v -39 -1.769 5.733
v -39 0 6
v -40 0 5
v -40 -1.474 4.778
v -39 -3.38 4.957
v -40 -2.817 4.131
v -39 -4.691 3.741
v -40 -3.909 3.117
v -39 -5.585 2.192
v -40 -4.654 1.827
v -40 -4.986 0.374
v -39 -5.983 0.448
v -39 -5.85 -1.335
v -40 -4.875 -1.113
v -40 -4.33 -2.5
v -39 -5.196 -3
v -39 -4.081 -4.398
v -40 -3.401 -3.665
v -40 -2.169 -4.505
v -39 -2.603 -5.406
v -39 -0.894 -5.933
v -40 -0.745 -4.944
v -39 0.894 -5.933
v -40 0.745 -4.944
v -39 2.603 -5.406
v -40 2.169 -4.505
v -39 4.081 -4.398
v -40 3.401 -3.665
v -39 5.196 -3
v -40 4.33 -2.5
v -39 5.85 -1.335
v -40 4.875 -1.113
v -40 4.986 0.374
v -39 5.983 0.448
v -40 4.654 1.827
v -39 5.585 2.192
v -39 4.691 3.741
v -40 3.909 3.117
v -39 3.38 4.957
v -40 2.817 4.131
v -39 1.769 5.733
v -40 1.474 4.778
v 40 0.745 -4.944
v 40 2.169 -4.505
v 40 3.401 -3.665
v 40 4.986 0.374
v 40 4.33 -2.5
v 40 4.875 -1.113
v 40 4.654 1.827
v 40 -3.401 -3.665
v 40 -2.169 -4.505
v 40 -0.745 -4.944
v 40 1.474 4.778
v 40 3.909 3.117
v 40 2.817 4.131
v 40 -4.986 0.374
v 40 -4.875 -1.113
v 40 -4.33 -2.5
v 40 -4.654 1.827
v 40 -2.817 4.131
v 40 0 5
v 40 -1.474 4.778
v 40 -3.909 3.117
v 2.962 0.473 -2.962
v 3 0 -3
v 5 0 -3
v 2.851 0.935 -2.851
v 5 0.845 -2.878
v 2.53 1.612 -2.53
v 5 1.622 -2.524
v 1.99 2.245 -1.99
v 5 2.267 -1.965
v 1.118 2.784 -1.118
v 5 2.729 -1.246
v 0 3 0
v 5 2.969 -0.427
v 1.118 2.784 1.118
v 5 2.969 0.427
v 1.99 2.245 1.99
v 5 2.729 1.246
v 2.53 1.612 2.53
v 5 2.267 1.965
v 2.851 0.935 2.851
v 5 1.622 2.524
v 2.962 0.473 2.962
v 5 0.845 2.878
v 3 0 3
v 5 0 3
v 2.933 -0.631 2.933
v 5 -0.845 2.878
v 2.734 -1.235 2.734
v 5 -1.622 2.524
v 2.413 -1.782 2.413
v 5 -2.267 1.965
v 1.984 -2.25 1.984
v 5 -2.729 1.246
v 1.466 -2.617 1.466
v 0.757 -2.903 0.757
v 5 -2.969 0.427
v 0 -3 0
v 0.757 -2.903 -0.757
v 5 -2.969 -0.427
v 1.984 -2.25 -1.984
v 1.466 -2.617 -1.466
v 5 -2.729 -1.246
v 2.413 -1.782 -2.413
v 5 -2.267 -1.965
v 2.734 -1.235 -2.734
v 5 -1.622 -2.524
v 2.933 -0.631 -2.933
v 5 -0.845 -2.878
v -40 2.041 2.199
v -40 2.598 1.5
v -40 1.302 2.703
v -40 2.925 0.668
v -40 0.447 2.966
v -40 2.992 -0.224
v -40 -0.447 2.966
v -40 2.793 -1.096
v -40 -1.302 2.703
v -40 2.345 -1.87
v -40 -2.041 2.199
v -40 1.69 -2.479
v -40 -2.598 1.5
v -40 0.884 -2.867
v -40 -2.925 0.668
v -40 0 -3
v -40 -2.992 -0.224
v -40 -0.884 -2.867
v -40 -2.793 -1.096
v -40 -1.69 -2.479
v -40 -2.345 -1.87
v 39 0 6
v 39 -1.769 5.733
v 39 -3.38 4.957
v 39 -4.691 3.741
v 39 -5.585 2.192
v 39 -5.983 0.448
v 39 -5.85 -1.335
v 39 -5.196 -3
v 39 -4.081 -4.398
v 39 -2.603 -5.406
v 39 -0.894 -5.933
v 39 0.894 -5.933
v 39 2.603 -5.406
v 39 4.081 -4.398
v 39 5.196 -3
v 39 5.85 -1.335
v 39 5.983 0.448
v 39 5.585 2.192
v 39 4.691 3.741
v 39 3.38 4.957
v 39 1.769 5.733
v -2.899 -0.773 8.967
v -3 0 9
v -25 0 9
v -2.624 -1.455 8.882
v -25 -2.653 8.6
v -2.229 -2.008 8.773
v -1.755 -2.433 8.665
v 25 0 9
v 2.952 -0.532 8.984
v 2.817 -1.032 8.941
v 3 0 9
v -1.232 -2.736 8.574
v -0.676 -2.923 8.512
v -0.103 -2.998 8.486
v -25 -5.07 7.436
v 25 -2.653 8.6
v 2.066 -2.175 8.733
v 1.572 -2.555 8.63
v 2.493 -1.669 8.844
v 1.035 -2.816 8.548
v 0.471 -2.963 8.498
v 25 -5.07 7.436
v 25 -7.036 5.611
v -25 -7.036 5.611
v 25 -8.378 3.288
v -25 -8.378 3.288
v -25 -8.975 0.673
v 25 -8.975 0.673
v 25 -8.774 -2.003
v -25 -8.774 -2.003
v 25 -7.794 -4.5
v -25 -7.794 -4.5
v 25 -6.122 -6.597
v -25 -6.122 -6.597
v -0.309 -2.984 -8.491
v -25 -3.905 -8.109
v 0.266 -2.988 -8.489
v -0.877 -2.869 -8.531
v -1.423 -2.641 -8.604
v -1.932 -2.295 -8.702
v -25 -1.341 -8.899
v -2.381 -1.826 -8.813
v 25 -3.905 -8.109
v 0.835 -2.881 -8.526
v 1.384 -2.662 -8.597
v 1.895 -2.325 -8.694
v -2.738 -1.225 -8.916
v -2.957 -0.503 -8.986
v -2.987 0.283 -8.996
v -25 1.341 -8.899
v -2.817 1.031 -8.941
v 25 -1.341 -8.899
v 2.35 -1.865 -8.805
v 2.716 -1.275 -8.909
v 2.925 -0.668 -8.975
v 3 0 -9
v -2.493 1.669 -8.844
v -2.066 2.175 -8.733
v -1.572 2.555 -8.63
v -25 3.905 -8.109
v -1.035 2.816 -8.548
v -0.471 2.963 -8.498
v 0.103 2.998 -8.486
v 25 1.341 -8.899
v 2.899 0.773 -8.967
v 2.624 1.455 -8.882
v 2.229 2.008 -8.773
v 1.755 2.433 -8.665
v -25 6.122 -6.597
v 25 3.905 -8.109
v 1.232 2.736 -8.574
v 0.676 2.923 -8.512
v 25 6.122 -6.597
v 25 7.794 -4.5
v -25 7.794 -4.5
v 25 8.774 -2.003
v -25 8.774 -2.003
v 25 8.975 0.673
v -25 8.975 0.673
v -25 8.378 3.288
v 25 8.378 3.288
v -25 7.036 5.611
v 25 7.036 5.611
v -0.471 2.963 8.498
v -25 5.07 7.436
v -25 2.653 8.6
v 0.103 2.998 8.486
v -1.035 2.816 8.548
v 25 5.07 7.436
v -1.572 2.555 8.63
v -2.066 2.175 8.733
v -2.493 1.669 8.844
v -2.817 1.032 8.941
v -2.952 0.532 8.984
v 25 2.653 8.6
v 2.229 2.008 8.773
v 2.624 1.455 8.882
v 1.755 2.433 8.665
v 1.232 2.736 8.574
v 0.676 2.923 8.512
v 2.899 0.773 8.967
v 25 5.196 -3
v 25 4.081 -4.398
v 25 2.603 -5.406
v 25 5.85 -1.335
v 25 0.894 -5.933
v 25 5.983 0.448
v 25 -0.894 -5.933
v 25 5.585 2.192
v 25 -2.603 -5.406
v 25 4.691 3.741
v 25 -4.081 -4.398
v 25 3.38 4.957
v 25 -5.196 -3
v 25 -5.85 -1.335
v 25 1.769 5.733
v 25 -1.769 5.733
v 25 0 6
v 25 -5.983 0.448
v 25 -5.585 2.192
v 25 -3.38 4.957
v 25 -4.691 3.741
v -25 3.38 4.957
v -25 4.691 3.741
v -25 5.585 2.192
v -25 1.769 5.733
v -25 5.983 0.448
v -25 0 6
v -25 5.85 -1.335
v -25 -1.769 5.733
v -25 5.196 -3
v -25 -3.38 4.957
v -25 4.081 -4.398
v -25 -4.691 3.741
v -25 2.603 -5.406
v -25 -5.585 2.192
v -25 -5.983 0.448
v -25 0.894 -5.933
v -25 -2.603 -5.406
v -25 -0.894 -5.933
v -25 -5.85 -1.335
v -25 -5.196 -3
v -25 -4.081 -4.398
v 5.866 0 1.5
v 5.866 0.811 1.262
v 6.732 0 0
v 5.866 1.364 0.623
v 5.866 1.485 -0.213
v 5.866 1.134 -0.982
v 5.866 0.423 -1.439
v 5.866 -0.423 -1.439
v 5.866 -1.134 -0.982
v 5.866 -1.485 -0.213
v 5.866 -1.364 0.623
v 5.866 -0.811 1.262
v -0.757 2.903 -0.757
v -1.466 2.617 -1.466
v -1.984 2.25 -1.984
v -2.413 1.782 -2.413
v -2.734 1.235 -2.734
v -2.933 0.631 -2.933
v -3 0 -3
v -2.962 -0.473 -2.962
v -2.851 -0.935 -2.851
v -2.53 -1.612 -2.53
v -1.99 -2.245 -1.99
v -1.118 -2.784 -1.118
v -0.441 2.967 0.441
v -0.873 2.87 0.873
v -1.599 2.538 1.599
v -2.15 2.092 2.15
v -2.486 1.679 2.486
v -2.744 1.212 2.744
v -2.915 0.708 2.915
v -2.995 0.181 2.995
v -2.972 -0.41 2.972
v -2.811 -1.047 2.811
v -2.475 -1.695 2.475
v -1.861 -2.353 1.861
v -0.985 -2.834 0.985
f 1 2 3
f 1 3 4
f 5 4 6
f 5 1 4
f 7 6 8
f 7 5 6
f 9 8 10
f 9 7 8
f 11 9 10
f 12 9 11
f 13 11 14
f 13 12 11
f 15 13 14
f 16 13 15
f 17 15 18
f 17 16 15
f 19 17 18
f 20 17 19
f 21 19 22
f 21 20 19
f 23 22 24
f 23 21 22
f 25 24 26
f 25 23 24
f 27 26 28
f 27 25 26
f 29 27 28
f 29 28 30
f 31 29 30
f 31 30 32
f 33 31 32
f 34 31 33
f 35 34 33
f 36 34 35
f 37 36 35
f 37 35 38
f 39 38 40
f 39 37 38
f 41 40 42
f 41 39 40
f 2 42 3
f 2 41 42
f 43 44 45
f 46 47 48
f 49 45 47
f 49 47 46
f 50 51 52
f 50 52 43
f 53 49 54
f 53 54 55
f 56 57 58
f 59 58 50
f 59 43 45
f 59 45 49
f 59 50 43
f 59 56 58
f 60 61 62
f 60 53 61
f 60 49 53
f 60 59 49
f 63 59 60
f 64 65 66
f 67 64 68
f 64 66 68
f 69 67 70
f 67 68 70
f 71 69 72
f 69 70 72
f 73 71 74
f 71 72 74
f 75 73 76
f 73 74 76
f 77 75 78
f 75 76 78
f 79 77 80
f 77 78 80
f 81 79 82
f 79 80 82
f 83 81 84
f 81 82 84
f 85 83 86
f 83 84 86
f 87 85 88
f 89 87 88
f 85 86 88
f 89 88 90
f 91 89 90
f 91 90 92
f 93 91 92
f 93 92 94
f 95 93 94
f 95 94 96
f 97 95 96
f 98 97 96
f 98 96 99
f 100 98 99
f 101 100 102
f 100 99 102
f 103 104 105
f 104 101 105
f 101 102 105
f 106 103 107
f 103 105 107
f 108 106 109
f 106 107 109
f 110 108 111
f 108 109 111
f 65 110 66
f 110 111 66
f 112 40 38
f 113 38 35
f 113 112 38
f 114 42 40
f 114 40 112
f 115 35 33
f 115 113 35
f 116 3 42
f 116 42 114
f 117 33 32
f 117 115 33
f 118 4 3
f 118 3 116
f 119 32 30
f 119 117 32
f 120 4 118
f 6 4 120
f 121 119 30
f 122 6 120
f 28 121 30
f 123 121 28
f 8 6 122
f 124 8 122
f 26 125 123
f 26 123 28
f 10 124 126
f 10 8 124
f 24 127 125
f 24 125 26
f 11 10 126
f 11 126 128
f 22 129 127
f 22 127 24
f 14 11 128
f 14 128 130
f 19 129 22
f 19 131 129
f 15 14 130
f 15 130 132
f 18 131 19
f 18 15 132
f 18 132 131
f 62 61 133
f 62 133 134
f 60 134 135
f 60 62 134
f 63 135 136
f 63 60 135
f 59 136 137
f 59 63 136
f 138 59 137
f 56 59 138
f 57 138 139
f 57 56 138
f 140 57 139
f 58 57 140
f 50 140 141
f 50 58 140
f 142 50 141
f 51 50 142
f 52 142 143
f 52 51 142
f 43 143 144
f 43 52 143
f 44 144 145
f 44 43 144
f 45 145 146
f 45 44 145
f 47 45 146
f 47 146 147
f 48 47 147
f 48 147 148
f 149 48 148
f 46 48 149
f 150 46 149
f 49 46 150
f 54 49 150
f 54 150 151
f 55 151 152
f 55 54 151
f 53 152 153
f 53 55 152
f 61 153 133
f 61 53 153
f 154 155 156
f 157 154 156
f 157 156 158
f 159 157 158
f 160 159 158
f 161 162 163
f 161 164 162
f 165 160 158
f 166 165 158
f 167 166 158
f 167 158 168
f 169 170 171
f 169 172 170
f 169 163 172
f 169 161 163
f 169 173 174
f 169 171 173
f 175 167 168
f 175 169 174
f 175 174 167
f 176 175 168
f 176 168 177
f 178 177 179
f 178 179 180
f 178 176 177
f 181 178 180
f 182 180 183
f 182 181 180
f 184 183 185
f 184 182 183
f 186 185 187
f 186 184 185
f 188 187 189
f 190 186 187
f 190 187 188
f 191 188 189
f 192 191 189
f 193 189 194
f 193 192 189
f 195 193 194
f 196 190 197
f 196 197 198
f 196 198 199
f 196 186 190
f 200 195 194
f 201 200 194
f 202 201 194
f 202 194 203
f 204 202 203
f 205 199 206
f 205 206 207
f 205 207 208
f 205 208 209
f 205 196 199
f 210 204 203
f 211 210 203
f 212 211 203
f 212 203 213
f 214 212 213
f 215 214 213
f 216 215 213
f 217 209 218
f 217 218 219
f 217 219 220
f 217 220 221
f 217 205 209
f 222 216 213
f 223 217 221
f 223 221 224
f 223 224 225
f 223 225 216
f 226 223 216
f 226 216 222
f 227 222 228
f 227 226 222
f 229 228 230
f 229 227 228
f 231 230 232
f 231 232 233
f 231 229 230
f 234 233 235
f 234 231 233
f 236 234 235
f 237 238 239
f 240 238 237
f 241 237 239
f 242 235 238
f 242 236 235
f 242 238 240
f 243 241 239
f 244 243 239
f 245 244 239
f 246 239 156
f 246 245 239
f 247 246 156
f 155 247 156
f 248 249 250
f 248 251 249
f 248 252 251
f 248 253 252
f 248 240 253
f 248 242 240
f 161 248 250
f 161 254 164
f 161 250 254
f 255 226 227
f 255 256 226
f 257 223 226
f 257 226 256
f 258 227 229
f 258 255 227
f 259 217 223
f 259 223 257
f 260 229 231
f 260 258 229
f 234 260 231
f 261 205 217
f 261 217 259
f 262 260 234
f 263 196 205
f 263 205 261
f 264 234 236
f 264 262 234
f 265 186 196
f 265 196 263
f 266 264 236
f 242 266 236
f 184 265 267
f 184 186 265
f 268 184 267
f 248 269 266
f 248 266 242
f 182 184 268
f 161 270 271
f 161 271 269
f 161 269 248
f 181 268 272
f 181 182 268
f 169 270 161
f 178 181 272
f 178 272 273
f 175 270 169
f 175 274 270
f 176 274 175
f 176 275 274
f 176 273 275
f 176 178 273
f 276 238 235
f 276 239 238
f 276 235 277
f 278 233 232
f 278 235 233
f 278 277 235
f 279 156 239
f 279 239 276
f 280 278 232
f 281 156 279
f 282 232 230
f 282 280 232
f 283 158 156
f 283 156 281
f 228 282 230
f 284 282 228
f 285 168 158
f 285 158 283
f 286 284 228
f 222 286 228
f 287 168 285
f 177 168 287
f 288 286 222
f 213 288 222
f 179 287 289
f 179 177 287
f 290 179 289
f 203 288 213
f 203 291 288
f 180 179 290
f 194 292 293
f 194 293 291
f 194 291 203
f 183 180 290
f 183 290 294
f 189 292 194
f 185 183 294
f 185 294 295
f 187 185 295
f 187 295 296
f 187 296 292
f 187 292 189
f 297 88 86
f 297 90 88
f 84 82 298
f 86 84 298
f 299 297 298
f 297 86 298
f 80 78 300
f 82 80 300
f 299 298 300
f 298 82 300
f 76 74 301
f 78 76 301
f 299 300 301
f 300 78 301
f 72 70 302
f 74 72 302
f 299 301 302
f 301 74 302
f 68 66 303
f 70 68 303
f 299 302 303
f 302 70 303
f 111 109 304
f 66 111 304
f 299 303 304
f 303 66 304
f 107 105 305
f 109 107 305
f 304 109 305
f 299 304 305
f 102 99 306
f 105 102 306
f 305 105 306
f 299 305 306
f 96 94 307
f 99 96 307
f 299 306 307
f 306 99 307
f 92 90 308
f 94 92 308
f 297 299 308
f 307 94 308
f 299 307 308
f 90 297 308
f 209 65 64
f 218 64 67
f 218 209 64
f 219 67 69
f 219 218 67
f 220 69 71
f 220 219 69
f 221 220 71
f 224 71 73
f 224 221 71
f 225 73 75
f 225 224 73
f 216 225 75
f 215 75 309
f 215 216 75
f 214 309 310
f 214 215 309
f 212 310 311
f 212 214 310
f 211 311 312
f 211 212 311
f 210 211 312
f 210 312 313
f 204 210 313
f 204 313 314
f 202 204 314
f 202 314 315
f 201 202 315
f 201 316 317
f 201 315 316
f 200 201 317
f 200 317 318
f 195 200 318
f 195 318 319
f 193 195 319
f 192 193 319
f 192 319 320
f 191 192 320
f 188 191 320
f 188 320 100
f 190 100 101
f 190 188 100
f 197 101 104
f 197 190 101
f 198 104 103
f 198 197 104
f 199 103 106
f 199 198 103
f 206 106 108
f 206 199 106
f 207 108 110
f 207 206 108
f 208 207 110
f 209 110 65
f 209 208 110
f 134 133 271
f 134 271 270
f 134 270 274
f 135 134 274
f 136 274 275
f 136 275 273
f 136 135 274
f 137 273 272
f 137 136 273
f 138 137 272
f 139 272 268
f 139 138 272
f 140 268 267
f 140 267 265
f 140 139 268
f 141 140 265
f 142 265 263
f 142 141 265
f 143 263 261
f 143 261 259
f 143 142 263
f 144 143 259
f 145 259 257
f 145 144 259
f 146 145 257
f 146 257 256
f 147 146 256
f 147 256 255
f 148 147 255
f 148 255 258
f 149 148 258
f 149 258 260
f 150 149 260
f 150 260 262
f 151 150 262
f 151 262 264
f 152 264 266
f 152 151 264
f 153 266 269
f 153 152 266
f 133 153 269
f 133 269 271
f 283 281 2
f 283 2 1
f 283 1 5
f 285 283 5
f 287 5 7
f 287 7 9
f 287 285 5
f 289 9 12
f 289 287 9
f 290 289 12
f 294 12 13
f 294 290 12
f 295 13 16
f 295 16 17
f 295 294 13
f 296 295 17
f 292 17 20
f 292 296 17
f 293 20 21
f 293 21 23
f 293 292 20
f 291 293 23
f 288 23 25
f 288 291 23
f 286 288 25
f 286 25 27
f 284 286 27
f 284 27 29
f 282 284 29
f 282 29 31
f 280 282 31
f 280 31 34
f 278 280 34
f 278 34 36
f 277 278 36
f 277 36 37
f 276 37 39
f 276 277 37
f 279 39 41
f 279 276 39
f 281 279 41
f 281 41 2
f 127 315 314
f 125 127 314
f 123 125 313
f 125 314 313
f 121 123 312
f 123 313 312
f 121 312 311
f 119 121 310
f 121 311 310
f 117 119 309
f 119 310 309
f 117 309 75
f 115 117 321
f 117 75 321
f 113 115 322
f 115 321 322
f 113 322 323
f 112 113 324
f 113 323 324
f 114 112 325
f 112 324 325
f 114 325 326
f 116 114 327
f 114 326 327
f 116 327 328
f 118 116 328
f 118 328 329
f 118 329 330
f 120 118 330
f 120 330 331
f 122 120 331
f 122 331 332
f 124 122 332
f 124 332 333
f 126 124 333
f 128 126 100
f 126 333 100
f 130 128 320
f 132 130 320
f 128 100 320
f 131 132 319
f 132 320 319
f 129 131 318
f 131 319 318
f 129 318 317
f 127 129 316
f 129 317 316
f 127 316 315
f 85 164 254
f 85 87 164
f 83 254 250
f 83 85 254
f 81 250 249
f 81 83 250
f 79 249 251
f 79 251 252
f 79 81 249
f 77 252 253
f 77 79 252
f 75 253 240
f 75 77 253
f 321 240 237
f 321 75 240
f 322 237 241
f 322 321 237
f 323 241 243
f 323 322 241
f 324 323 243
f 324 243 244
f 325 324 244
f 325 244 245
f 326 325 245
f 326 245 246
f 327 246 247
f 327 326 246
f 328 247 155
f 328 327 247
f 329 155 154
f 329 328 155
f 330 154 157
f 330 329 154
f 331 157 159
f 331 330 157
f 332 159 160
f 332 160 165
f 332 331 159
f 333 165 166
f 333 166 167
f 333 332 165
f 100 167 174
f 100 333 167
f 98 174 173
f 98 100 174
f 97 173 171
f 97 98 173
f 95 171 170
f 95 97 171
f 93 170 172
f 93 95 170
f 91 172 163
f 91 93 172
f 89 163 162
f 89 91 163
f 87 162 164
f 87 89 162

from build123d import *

# Parameters (mm, degrees)
CUT_EXTRUDE1_DEPTH        = 42.976183724
CUT_EXTRUDE1_DEPTH_BACK   = 42.976183724
SKETCH2_R                 = 3
F_6_0MM_DOWEL_HOLE1_D     = 6
F_6_0MM_DOWEL_HOLE1_DEPTH = 45
F_6_0MM_DOWEL_HOLE1_TIP   = 1.732050808
CHAMFER1_SIZE             = 1


with BuildPart() as part:
    # Sketch1 → Revolve1 (revolve)
    with BuildSketch(Plane.XY, mode=Mode.PRIVATE) as revolve1_sk:
        Polygon((-40, 0), (-40, 6), (-25, 6), (-25, 9), (25, 9), (25, 6), (40, 6), (40, 0), align=None)
    revolve(revolve1_sk.sketch.rotate(Axis((0, 0, 0), (1, 0, 0)), 90), axis=Axis((0, 0, 0), (1, 0, 0)))

    # Sketch2 → Cut-Extrude1 (cut, two sides: drawn at the far end of the back side and taken through both)
    with BuildSketch(Plane.XY.offset(-CUT_EXTRUDE1_DEPTH_BACK)):
        Circle(SKETCH2_R)
    extrude(amount=CUT_EXTRUDE1_DEPTH + CUT_EXTRUDE1_DEPTH_BACK, mode=Mode.SUBTRACT)

    # Ø6.0mm Dowel Hole1
    with Locations(Plane.ZY.offset(40)):
        with Locations((0, 0)):
            Hole(F_6_0MM_DOWEL_HOLE1_D / 2, depth=F_6_0MM_DOWEL_HOLE1_DEPTH)
            with Locations((0, 0, -(F_6_0MM_DOWEL_HOLE1_DEPTH + F_6_0MM_DOWEL_HOLE1_TIP / 2))):  # 120° drill point
                Cone(0, F_6_0MM_DOWEL_HOLE1_D / 2, F_6_0MM_DOWEL_HOLE1_TIP, mode=Mode.SUBTRACT)

    # Chamfer1
    chamfer1_edges = [part.edges().sort_by_distance(p)[0] for p in [
        (40, 0, -6),
        (-40, 0, -6),
    ]]
    chamfer(chamfer1_edges, length=CHAMFER1_SIZE)


solid = part.part
